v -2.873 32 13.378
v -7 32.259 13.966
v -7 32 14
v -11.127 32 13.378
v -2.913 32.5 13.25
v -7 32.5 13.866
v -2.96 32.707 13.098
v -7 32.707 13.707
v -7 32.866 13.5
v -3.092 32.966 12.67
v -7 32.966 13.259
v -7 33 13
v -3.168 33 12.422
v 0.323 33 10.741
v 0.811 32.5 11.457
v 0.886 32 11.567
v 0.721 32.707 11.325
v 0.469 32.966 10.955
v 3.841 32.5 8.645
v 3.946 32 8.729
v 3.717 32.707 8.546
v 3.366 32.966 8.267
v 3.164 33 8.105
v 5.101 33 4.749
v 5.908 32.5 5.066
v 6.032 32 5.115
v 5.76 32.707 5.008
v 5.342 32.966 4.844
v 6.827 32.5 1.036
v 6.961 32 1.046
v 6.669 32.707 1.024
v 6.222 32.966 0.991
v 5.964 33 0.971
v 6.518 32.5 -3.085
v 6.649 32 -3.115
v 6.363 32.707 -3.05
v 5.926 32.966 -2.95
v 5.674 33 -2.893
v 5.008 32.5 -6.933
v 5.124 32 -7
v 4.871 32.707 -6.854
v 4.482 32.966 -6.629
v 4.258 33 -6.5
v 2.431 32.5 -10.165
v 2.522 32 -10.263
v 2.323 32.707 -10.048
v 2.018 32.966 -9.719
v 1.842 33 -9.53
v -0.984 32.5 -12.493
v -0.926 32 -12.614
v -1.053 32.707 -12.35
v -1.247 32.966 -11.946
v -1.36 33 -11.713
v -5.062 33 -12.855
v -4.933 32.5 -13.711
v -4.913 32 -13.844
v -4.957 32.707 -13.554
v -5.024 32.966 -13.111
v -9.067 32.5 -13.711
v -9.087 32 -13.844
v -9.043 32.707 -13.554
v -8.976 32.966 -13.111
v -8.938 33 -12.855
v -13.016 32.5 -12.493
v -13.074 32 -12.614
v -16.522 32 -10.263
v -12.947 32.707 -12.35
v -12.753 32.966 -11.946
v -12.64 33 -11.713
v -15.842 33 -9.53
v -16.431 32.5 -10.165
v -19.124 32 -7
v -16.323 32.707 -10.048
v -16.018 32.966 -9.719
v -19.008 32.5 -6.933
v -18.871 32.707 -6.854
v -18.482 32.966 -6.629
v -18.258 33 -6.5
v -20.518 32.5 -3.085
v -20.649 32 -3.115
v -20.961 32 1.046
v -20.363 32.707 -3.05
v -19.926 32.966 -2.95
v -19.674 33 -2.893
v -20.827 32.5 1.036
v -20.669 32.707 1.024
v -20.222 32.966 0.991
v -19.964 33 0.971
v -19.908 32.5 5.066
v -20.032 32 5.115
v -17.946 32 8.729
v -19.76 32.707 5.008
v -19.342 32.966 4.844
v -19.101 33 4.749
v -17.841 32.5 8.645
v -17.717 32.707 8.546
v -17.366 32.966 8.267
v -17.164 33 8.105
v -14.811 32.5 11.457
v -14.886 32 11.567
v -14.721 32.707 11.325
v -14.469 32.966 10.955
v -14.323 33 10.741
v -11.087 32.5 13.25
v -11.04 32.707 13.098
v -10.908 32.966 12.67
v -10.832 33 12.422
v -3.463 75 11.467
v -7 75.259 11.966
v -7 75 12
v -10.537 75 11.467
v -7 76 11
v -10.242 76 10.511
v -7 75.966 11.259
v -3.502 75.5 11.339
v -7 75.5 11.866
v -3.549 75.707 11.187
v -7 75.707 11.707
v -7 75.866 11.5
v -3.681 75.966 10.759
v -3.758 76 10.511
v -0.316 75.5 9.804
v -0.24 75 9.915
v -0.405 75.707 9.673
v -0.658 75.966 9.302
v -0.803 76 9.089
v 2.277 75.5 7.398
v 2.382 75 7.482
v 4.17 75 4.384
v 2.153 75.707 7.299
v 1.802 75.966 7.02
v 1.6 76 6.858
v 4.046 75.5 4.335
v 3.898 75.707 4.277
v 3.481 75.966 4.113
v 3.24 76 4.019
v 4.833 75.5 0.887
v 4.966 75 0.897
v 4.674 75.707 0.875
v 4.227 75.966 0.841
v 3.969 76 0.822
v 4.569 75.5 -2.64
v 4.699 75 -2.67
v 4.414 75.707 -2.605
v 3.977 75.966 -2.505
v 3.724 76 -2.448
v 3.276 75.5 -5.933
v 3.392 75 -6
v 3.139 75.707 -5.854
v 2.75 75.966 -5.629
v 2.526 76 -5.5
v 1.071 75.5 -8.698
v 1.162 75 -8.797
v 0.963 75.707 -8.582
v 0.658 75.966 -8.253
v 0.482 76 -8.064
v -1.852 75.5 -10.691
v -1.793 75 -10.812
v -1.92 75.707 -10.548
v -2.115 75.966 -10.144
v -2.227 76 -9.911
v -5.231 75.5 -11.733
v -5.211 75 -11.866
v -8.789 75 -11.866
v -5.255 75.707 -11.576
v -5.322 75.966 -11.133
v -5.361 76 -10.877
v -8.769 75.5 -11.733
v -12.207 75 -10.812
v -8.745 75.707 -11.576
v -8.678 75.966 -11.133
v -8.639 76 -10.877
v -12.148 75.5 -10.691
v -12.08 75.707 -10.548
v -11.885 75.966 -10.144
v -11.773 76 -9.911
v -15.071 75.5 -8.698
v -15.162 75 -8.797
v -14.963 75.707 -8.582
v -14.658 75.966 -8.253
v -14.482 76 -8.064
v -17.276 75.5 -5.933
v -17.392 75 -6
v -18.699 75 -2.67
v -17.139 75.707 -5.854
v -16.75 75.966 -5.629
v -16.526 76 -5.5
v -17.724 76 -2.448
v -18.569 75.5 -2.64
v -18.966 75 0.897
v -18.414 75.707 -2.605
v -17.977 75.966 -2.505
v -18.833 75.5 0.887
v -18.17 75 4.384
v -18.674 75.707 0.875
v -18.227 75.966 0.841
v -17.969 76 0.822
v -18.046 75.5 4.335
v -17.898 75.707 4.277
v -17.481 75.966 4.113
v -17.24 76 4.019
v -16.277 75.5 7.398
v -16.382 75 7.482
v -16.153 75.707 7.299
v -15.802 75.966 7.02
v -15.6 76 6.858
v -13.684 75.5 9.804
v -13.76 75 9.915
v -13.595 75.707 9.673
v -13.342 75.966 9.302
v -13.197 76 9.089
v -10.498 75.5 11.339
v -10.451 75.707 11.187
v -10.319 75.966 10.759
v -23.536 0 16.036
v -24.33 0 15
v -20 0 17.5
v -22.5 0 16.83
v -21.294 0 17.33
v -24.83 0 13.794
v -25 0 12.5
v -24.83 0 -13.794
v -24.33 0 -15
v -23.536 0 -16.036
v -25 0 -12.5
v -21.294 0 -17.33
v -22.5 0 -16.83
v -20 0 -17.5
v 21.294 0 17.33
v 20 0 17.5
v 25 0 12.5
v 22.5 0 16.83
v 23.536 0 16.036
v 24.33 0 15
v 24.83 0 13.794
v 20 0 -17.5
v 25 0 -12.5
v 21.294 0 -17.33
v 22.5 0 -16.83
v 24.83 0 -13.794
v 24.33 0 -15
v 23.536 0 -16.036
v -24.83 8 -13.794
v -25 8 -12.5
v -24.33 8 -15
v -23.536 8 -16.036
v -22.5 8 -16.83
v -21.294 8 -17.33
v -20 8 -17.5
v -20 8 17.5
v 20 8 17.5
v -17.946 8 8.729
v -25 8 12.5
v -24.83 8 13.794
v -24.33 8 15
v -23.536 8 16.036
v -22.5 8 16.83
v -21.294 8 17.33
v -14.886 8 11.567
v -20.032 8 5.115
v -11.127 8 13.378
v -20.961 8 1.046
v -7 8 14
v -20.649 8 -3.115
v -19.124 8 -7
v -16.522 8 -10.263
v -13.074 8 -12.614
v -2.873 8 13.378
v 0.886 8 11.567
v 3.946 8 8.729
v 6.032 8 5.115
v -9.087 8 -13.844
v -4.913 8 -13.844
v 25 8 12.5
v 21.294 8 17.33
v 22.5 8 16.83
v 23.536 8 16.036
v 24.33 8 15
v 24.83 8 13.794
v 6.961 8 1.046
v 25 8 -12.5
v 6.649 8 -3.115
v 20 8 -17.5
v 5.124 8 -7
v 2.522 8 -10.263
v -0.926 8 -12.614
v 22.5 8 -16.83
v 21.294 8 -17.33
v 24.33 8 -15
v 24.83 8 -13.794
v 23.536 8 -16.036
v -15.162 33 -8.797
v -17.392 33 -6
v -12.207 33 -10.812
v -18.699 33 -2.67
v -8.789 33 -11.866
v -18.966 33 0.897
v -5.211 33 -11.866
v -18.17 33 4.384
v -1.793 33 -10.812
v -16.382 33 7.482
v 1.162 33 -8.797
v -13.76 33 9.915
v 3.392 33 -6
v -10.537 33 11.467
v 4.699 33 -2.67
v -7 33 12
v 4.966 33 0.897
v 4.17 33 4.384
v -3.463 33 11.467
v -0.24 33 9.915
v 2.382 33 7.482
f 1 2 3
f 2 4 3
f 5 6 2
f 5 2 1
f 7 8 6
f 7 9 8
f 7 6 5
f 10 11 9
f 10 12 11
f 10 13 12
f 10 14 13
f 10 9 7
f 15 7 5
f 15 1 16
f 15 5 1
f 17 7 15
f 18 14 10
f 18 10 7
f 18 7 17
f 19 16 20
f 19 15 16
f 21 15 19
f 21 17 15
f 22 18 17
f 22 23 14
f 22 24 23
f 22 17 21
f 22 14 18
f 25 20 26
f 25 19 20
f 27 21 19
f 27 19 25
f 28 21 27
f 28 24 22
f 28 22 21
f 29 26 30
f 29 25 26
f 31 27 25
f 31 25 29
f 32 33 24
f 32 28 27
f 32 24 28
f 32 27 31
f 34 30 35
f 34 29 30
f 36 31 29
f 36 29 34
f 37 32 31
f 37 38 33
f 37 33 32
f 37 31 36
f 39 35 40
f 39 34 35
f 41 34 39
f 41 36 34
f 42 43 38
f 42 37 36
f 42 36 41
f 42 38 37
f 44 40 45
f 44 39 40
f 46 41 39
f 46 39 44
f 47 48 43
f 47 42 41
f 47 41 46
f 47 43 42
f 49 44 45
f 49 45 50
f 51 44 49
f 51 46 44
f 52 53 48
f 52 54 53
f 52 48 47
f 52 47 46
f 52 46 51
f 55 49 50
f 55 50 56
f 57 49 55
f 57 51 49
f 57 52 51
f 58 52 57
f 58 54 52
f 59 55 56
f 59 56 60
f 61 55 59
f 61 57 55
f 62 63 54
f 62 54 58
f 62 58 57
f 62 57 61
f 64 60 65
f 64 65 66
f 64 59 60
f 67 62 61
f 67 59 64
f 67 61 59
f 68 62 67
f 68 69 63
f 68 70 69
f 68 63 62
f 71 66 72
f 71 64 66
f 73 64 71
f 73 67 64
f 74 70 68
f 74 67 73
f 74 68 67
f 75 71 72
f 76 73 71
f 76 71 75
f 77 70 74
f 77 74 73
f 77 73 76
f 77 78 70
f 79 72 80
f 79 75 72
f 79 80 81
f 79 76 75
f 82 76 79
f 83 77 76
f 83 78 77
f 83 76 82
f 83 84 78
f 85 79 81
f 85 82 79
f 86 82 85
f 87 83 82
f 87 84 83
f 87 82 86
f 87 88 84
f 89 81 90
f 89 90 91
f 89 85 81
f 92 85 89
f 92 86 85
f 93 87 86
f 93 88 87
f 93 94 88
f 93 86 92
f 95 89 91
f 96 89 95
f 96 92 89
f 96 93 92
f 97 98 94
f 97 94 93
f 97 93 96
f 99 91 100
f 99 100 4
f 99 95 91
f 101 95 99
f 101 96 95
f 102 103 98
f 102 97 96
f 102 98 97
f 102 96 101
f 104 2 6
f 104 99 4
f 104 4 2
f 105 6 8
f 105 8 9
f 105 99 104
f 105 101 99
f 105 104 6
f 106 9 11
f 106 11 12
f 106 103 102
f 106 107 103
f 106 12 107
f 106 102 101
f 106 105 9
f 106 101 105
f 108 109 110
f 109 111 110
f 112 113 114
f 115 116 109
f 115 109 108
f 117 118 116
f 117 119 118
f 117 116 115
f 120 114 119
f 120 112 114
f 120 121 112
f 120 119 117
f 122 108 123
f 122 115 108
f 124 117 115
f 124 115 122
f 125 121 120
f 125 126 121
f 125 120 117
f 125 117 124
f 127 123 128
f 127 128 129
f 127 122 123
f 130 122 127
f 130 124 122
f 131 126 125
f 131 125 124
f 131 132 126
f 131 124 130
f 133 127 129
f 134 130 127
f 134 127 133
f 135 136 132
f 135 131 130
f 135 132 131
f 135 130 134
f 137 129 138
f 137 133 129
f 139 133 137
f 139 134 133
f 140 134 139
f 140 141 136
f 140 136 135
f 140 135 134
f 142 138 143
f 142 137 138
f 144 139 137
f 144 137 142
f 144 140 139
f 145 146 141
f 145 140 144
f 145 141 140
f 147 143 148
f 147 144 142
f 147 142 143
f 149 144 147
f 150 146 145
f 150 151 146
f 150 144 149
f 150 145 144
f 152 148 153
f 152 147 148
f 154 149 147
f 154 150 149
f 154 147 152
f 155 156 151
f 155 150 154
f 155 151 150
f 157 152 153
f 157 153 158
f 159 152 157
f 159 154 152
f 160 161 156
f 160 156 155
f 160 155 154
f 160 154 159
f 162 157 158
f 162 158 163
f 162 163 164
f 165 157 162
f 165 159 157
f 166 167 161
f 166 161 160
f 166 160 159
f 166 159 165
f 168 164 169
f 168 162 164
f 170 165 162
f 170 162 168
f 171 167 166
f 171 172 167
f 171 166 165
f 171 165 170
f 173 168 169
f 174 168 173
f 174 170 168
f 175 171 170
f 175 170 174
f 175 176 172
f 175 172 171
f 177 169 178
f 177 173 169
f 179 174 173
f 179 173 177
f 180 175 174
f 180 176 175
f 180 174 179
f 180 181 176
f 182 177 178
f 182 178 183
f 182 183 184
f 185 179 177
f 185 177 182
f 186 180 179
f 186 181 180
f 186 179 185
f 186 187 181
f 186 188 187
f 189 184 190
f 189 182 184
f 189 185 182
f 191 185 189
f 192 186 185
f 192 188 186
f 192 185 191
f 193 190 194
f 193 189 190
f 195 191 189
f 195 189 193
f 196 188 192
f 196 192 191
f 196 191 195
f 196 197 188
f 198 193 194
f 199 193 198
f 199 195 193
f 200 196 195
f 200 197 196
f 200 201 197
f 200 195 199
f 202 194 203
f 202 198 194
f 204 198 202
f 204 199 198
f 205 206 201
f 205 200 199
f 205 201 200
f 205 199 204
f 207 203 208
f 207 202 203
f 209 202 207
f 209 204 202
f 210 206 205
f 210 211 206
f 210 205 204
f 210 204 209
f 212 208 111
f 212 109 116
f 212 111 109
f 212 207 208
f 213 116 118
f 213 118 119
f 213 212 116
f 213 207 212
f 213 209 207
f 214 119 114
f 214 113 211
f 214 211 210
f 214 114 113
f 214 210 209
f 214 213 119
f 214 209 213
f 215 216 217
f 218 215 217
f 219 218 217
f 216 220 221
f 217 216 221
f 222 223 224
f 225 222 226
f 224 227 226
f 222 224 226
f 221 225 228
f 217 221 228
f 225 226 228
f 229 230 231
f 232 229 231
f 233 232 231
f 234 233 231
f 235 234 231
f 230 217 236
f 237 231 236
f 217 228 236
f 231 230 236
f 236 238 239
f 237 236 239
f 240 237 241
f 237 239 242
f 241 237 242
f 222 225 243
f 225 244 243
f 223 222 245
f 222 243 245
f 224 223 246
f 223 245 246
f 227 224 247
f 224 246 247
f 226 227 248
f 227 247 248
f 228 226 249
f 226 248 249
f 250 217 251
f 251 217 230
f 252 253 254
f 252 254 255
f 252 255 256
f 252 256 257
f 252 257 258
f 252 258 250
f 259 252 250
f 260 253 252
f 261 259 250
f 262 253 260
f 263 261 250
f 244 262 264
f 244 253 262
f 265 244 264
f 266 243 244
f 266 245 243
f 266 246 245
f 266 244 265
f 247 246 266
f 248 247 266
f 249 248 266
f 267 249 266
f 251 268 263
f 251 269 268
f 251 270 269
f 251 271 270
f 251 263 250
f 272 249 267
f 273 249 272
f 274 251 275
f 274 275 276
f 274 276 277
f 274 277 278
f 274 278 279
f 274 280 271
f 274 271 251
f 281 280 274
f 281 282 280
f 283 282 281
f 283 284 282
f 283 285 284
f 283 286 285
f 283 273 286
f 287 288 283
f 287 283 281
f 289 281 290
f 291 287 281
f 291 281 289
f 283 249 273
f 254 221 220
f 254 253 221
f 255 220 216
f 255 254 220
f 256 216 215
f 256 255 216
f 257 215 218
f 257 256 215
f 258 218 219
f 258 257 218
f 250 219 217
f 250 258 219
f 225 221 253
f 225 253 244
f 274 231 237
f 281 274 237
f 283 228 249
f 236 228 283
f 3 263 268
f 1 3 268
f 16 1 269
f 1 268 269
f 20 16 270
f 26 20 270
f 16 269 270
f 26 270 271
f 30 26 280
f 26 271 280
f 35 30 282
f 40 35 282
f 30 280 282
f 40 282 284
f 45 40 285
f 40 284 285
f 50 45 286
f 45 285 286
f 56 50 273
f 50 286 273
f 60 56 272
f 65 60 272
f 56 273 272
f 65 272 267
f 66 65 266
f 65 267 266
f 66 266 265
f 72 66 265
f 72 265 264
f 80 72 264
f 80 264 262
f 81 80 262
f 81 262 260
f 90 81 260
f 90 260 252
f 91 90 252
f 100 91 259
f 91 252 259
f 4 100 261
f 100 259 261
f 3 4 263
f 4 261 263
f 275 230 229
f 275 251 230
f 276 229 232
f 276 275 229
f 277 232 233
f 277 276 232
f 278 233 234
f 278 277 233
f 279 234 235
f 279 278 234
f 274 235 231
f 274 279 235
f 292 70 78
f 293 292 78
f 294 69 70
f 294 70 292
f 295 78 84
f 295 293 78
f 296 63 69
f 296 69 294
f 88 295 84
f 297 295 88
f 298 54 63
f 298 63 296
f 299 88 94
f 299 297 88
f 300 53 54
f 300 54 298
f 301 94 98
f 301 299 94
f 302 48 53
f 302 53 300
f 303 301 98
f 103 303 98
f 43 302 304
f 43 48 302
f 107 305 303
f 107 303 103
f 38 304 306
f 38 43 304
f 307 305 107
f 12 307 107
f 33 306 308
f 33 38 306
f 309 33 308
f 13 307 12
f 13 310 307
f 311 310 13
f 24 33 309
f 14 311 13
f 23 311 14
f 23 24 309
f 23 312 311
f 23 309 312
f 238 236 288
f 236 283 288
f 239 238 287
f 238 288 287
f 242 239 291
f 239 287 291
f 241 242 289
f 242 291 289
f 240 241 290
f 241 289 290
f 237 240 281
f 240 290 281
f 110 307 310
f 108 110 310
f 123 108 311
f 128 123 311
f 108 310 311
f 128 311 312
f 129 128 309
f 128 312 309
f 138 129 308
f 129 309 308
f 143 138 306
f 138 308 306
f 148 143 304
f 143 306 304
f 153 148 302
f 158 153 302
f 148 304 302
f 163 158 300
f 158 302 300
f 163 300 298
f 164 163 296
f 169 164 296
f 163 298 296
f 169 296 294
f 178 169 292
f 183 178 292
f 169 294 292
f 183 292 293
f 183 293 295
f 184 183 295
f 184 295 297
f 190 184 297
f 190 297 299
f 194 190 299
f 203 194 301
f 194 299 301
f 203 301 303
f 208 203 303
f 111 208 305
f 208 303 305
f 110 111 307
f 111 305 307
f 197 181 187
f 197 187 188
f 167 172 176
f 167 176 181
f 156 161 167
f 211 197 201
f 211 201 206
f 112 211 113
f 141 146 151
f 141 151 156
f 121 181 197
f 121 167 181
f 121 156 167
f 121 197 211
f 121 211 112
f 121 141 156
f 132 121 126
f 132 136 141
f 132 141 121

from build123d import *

# Parameters (mm, degrees)
SKETCH1_W           = 50
SKETCH1_H           = 35
BOSS_EXTRUDE1_DEPTH = 8
SKETCH2_R           = 14
BOSS_EXTRUDE2_DEPTH = 25
SKETCH3_R           = 12
BOSS_EXTRUDE3_DEPTH = 43
FILLET1_R           = 5
FILLET2_R           = 1


with BuildPart() as part:
    # Sketch1 → Boss-Extrude1 (new body)
    with BuildSketch(Plane(origin=(0, 0, 0), x_dir=(1, 0, 0), z_dir=(0, 1, 0))):
        Rectangle(SKETCH1_W, SKETCH1_H)
    extrude(amount=BOSS_EXTRUDE1_DEPTH)

    # Sketch2 → Boss-Extrude2 (add)
    with BuildSketch(Plane(origin=(0, 8, 0), x_dir=(1, 0, 0), z_dir=(0, 1, 0))):
        with Locations(Location((-7, 0, 0), (0, 0, 270))):
            Circle(SKETCH2_R)
    extrude(amount=BOSS_EXTRUDE2_DEPTH)

    # Sketch3 → Boss-Extrude3 (add)
    with BuildSketch(Plane(origin=(0, 33, 0), x_dir=(1, 0, 0), z_dir=(0, 1, 0))):
        with Locations(Location((-7, 0, 0), (0, 0, 270))):
            Circle(SKETCH3_R)
    extrude(amount=BOSS_EXTRUDE3_DEPTH)

    # Fillet1
    fillet1_edges = [part.edges().sort_by_distance(p)[0] for p in [
        (25, 4, 17.5),
        (-25, 4, 17.5),
        (-25, 4, -17.5),
        (25, 4, -17.5),
    ]]
    fillet(fillet1_edges, radius=FILLET1_R)

    # Fillet2
    fillet2_edges = [part.edges().sort_by_distance(p)[0] for p in [
        (-7, 33, -14),
        (-7, 76, -12),
    ]]
    fillet(fillet2_edges, radius=FILLET2_R)


solid = part.part
